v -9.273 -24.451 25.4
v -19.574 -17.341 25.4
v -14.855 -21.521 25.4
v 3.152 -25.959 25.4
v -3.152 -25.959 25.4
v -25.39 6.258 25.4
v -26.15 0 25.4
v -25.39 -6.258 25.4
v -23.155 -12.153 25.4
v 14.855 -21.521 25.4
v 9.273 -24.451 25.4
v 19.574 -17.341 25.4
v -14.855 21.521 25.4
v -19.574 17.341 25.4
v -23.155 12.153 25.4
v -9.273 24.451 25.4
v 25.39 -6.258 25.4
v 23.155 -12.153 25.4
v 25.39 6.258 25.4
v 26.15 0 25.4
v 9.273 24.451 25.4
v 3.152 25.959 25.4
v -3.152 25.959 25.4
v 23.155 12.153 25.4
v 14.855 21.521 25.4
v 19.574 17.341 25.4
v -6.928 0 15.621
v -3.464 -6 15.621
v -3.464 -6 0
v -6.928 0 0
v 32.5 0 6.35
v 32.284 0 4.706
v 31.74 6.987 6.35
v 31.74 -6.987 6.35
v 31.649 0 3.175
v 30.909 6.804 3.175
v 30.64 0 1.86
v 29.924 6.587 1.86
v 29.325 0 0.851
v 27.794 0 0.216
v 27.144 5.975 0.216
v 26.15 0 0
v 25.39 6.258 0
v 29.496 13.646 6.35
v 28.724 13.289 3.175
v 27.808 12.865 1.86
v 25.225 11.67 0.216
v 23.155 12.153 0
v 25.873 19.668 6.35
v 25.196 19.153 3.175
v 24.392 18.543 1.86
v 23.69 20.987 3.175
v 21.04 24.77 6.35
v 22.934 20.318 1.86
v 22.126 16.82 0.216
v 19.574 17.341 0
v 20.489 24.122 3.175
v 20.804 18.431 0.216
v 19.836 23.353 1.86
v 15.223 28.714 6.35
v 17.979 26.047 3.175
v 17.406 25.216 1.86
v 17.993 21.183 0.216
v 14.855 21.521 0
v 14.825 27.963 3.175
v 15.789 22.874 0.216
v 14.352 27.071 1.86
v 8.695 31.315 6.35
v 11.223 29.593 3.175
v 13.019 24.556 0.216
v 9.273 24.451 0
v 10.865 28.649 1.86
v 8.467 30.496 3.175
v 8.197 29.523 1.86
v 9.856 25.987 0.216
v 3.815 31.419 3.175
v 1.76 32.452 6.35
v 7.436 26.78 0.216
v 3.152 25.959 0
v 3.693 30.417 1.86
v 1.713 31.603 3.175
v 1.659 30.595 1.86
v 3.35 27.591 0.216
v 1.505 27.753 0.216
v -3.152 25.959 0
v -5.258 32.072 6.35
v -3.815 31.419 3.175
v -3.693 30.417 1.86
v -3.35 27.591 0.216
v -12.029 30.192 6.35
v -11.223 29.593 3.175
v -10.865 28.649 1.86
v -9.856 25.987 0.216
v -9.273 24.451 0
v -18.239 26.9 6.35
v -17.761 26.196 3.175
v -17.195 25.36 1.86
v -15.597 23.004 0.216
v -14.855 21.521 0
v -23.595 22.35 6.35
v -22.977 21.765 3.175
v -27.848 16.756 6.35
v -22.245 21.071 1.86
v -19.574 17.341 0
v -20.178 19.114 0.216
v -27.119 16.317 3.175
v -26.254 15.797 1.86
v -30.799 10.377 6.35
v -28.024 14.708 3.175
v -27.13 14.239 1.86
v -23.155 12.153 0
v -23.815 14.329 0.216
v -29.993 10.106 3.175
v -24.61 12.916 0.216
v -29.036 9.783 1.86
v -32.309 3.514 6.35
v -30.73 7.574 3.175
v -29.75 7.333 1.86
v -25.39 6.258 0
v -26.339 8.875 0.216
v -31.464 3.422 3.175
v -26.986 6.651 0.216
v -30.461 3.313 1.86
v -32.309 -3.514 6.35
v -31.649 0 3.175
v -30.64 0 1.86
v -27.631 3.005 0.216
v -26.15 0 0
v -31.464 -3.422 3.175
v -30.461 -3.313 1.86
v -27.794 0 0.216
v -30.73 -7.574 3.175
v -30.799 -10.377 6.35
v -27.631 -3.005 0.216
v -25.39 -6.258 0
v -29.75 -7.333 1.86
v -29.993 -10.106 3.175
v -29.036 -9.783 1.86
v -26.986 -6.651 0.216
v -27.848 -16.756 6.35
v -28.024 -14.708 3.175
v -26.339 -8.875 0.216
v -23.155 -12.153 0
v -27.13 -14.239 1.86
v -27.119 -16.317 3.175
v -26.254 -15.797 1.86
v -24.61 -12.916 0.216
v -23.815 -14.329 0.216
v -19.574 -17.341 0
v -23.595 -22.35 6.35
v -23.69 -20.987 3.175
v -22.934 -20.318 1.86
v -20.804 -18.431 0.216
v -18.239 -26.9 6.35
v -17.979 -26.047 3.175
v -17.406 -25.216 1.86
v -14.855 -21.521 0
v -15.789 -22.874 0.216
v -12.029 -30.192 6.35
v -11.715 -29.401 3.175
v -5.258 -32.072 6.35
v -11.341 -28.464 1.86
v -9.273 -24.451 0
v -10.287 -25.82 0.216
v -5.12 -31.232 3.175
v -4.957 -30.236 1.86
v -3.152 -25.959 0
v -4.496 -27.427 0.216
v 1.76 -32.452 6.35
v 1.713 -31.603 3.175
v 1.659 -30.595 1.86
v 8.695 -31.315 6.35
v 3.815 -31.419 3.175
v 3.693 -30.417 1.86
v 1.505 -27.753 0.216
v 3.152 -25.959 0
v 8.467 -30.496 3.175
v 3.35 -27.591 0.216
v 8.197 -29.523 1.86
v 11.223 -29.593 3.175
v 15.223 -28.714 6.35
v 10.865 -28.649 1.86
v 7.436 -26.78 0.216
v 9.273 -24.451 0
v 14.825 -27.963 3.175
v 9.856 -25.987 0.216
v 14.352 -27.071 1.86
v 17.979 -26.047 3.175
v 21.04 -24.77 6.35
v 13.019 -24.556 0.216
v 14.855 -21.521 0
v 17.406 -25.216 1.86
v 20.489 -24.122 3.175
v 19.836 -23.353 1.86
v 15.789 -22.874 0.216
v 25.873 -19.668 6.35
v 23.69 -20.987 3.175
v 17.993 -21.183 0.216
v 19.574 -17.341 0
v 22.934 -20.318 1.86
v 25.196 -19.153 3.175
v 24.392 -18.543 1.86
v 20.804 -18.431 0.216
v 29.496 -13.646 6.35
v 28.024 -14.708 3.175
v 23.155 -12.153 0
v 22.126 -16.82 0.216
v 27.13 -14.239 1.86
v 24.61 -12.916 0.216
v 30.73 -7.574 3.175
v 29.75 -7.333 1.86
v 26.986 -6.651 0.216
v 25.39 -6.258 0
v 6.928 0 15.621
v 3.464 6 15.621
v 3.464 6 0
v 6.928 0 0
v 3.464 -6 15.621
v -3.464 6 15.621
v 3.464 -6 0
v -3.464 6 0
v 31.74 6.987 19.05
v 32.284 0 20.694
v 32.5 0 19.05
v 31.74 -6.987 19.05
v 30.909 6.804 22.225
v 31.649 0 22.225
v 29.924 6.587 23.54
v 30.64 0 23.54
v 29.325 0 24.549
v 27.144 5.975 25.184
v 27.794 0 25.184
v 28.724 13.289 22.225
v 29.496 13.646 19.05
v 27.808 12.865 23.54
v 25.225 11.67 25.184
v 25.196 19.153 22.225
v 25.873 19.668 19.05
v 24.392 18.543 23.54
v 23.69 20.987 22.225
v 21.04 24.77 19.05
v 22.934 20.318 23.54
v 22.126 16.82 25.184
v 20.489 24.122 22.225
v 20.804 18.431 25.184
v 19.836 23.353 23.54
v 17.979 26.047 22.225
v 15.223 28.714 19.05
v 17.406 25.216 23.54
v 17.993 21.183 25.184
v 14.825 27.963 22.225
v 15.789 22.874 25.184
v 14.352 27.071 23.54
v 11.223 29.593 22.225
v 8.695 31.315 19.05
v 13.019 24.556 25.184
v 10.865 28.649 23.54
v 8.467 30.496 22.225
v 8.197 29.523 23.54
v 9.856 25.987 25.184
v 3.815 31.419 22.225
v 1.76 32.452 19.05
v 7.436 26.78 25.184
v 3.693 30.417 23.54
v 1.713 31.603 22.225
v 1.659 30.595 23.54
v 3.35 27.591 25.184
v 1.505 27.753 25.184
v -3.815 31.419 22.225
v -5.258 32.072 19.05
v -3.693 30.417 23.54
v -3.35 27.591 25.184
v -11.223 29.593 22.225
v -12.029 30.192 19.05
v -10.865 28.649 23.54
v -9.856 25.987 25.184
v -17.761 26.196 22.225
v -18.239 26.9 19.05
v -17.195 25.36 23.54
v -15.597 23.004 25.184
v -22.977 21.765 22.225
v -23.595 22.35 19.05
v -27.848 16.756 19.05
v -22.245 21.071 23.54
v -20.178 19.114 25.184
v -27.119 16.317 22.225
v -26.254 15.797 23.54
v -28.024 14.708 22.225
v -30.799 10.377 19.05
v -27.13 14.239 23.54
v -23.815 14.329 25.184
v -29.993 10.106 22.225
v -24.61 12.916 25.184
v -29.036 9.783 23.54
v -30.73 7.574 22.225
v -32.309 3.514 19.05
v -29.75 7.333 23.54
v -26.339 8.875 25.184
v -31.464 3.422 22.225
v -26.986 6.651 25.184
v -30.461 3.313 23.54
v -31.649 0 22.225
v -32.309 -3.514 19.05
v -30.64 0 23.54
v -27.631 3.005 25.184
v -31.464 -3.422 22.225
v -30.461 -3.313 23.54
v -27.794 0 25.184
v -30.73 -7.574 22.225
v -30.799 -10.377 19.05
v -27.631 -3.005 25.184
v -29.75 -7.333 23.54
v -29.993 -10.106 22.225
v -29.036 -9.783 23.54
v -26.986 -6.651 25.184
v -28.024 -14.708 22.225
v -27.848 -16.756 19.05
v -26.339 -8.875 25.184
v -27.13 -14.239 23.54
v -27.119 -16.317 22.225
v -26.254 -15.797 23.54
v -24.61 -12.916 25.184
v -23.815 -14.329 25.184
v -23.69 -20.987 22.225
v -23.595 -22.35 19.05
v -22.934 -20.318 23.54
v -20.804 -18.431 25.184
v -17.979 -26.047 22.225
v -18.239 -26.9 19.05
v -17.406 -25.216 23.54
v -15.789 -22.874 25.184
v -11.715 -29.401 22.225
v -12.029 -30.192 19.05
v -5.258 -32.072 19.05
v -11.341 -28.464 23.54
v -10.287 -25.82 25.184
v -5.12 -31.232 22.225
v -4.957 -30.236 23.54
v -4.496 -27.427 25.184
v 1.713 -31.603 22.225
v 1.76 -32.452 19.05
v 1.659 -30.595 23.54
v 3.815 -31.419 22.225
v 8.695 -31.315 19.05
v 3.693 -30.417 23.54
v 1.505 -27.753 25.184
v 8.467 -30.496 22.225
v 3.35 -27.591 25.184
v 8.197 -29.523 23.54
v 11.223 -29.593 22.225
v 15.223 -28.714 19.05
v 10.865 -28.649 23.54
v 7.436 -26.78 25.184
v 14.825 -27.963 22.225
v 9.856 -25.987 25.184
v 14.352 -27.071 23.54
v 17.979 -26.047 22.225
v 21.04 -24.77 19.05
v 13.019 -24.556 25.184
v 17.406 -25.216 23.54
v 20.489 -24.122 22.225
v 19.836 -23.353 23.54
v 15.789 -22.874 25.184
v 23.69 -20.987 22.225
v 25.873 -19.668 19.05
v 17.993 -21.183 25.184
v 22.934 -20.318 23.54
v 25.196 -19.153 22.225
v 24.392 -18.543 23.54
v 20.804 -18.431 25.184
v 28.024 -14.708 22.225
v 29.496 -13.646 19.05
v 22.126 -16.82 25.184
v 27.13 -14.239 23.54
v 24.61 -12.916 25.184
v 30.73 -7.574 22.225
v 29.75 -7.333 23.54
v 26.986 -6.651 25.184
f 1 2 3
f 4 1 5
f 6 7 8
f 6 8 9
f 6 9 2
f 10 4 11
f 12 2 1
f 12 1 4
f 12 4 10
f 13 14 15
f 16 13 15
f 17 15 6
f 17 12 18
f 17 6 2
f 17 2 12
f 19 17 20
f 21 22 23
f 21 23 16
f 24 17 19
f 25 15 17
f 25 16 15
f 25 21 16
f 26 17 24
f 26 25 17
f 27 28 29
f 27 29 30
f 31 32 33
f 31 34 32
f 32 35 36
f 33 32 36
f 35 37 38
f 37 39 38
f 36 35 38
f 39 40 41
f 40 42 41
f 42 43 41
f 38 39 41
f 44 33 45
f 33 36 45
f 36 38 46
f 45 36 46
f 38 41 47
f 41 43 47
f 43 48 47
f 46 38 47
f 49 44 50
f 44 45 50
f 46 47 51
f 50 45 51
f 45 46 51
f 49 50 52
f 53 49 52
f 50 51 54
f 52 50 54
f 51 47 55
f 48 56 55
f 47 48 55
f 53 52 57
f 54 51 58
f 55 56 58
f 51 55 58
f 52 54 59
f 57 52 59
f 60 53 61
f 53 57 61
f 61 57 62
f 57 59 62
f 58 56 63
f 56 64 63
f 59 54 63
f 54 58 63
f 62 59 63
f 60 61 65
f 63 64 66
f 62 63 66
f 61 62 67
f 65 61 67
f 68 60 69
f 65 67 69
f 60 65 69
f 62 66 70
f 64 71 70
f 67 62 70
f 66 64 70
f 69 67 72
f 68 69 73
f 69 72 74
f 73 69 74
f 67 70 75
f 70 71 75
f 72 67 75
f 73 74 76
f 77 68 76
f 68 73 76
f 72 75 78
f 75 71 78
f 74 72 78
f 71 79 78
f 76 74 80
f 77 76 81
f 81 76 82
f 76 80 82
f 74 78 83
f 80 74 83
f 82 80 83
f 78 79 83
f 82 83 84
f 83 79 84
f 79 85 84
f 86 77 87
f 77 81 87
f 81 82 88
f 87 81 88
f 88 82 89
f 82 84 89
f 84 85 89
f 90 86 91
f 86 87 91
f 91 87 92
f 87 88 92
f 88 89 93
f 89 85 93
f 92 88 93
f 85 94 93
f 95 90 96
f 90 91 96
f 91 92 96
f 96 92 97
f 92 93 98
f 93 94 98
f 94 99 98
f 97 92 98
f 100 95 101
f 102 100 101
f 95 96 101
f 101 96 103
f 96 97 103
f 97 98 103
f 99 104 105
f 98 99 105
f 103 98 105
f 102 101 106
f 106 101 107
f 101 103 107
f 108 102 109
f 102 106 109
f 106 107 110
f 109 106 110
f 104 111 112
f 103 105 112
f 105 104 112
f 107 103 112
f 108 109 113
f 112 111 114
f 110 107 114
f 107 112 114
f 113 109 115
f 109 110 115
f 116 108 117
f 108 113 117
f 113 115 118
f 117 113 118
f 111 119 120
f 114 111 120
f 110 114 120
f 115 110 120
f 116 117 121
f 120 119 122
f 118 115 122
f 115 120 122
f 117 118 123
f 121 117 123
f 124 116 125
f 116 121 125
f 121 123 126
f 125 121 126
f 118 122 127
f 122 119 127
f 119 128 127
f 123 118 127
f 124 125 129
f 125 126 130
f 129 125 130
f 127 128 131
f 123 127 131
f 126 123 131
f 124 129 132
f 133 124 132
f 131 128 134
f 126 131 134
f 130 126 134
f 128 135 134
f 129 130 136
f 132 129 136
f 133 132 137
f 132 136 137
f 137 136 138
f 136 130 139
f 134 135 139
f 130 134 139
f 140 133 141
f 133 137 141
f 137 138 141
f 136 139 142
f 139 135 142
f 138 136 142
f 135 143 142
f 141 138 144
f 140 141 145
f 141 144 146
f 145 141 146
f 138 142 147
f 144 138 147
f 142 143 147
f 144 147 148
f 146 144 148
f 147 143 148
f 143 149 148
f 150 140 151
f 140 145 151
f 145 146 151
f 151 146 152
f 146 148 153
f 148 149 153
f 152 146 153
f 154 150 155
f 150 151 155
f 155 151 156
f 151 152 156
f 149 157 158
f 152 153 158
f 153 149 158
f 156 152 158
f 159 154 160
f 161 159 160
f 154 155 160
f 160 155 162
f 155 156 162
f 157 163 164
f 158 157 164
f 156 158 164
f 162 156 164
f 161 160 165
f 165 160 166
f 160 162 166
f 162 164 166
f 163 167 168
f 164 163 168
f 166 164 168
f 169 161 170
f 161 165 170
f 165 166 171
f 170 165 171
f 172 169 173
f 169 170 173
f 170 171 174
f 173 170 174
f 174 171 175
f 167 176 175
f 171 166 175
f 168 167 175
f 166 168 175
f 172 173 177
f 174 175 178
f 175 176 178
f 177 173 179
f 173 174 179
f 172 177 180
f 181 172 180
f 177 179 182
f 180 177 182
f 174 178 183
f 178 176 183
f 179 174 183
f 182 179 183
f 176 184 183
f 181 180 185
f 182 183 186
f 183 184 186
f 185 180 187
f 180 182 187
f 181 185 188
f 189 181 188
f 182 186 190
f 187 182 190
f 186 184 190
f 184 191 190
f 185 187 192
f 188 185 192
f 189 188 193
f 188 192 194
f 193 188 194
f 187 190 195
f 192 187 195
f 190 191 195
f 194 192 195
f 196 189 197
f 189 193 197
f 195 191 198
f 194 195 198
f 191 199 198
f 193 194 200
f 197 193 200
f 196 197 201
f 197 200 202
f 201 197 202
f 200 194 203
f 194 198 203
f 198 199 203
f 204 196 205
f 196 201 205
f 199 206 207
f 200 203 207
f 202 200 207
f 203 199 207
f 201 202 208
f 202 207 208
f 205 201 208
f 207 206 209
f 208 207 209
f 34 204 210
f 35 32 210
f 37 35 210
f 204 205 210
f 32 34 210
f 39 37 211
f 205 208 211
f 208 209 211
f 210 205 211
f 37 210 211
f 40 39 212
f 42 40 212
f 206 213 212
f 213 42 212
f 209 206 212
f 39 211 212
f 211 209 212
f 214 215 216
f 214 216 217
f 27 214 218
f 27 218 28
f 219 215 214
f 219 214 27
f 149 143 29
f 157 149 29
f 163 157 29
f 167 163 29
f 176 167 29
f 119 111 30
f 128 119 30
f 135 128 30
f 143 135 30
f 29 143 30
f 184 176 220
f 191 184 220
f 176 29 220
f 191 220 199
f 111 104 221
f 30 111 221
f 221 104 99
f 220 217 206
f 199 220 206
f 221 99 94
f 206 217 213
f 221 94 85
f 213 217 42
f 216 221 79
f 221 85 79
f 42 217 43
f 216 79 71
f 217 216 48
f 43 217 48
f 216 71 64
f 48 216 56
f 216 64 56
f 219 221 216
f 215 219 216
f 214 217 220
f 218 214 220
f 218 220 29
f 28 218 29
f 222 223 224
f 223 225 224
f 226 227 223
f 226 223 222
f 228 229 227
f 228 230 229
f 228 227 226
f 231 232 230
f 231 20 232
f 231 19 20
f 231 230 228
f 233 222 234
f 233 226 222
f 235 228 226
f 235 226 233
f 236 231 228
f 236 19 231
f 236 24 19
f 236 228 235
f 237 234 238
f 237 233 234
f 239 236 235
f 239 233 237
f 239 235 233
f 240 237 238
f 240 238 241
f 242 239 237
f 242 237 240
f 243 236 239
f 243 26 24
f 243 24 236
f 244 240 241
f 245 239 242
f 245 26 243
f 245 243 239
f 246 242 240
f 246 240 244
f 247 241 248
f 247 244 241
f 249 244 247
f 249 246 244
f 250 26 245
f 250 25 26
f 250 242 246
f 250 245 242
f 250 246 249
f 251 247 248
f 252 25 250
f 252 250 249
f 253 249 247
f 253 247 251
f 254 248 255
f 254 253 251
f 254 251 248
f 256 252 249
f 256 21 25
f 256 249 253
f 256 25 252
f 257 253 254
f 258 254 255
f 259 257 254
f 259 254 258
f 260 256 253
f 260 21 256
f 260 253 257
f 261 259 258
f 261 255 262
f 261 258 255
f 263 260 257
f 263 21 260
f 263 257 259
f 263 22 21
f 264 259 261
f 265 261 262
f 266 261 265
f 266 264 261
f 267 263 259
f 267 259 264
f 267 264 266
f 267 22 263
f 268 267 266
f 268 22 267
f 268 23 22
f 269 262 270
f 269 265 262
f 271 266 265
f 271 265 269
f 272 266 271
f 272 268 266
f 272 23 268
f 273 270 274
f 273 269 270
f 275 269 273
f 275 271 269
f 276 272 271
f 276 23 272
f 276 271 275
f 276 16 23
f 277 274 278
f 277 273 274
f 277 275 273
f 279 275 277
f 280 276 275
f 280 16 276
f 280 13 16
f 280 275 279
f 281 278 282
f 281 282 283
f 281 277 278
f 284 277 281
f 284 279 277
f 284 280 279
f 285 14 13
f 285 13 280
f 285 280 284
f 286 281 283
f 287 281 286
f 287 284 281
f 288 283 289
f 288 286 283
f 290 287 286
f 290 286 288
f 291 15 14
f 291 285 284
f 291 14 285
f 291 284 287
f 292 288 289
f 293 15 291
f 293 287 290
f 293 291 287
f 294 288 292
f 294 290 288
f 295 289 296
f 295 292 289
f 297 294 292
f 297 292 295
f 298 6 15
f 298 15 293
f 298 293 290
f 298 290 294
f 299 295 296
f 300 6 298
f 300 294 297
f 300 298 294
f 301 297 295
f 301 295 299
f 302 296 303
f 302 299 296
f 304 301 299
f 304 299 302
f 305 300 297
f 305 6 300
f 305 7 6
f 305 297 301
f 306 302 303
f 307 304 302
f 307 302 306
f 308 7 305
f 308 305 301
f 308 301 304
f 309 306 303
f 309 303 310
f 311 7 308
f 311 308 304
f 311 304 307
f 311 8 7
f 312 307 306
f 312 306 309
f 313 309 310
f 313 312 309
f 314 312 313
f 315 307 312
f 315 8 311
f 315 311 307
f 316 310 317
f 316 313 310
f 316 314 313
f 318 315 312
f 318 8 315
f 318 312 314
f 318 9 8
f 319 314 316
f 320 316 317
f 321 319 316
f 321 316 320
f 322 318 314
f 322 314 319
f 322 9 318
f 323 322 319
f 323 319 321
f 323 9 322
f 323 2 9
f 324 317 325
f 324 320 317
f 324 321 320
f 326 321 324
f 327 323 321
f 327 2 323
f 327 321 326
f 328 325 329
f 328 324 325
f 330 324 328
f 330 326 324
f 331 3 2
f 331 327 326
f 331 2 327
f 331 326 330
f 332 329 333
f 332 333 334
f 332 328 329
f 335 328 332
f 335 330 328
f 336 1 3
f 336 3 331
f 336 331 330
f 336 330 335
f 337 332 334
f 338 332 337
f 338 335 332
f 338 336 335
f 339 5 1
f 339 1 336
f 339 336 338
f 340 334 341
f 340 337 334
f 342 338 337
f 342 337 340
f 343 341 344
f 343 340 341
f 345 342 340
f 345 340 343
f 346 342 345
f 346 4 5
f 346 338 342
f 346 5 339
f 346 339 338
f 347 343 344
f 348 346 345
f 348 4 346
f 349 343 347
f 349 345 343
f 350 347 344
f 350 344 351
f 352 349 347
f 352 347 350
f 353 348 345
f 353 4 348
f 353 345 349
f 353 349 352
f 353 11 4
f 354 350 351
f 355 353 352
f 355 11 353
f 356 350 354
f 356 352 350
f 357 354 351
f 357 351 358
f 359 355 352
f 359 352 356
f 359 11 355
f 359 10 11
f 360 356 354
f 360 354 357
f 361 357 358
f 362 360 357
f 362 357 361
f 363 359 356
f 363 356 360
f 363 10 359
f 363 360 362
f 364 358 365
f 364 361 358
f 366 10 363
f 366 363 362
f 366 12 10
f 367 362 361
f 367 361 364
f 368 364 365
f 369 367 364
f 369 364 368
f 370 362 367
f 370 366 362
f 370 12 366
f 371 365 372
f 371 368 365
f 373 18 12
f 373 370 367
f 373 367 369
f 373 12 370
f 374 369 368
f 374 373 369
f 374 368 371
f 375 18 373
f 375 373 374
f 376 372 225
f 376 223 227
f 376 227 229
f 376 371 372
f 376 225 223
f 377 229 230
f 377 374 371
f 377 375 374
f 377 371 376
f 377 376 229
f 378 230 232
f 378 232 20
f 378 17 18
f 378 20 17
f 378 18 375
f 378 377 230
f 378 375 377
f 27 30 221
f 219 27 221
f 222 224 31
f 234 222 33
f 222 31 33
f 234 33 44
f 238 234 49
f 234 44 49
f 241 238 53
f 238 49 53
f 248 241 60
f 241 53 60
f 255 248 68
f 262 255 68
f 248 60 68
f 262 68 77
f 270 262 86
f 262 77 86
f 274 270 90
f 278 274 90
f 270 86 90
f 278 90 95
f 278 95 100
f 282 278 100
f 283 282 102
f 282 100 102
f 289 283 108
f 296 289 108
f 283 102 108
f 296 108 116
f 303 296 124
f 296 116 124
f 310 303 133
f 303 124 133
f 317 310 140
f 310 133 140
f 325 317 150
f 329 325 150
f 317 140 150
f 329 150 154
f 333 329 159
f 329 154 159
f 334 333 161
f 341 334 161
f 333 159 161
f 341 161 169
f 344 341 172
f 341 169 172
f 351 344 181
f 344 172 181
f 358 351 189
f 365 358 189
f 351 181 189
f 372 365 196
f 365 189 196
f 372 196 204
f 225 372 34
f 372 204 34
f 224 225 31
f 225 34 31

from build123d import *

# Parameters (mm, degrees)
SKETCH1_R           = 32.5
BOSS_EXTRUDE1_DEPTH = 25.4
FILLET1_R           = 6.35
CUT_EXTRUDE1_DEPTH  = 15.621


with BuildPart() as part:
    # Sketch1 → Boss-Extrude1 (new body)
    with BuildSketch(Plane.XY):
        Circle(SKETCH1_R)
    extrude(amount=BOSS_EXTRUDE1_DEPTH)

    # Fillet1
    fillet1_edges = [part.edges().sort_by_distance(p)[0] for p in [
        (-32.5, 0, 0),
        (-32.5, 0, 25.4),
    ]]
    fillet(fillet1_edges, radius=FILLET1_R)

    # Sketch2 → Cut-Extrude1 (cut)
    with BuildSketch(Plane(origin=(0, 0, 0), x_dir=(-1, 0, 0), z_dir=(0, 0, -1))):
        Polygon((3.464101615, -6), (6.92820323, 0), (3.464101615, 6), (-3.464101615, 6), (-6.92820323, 0), (-3.464101615, -6), align=None)
    extrude(amount=-CUT_EXTRUDE1_DEPTH, mode=Mode.SUBTRACT)


solid = part.part
